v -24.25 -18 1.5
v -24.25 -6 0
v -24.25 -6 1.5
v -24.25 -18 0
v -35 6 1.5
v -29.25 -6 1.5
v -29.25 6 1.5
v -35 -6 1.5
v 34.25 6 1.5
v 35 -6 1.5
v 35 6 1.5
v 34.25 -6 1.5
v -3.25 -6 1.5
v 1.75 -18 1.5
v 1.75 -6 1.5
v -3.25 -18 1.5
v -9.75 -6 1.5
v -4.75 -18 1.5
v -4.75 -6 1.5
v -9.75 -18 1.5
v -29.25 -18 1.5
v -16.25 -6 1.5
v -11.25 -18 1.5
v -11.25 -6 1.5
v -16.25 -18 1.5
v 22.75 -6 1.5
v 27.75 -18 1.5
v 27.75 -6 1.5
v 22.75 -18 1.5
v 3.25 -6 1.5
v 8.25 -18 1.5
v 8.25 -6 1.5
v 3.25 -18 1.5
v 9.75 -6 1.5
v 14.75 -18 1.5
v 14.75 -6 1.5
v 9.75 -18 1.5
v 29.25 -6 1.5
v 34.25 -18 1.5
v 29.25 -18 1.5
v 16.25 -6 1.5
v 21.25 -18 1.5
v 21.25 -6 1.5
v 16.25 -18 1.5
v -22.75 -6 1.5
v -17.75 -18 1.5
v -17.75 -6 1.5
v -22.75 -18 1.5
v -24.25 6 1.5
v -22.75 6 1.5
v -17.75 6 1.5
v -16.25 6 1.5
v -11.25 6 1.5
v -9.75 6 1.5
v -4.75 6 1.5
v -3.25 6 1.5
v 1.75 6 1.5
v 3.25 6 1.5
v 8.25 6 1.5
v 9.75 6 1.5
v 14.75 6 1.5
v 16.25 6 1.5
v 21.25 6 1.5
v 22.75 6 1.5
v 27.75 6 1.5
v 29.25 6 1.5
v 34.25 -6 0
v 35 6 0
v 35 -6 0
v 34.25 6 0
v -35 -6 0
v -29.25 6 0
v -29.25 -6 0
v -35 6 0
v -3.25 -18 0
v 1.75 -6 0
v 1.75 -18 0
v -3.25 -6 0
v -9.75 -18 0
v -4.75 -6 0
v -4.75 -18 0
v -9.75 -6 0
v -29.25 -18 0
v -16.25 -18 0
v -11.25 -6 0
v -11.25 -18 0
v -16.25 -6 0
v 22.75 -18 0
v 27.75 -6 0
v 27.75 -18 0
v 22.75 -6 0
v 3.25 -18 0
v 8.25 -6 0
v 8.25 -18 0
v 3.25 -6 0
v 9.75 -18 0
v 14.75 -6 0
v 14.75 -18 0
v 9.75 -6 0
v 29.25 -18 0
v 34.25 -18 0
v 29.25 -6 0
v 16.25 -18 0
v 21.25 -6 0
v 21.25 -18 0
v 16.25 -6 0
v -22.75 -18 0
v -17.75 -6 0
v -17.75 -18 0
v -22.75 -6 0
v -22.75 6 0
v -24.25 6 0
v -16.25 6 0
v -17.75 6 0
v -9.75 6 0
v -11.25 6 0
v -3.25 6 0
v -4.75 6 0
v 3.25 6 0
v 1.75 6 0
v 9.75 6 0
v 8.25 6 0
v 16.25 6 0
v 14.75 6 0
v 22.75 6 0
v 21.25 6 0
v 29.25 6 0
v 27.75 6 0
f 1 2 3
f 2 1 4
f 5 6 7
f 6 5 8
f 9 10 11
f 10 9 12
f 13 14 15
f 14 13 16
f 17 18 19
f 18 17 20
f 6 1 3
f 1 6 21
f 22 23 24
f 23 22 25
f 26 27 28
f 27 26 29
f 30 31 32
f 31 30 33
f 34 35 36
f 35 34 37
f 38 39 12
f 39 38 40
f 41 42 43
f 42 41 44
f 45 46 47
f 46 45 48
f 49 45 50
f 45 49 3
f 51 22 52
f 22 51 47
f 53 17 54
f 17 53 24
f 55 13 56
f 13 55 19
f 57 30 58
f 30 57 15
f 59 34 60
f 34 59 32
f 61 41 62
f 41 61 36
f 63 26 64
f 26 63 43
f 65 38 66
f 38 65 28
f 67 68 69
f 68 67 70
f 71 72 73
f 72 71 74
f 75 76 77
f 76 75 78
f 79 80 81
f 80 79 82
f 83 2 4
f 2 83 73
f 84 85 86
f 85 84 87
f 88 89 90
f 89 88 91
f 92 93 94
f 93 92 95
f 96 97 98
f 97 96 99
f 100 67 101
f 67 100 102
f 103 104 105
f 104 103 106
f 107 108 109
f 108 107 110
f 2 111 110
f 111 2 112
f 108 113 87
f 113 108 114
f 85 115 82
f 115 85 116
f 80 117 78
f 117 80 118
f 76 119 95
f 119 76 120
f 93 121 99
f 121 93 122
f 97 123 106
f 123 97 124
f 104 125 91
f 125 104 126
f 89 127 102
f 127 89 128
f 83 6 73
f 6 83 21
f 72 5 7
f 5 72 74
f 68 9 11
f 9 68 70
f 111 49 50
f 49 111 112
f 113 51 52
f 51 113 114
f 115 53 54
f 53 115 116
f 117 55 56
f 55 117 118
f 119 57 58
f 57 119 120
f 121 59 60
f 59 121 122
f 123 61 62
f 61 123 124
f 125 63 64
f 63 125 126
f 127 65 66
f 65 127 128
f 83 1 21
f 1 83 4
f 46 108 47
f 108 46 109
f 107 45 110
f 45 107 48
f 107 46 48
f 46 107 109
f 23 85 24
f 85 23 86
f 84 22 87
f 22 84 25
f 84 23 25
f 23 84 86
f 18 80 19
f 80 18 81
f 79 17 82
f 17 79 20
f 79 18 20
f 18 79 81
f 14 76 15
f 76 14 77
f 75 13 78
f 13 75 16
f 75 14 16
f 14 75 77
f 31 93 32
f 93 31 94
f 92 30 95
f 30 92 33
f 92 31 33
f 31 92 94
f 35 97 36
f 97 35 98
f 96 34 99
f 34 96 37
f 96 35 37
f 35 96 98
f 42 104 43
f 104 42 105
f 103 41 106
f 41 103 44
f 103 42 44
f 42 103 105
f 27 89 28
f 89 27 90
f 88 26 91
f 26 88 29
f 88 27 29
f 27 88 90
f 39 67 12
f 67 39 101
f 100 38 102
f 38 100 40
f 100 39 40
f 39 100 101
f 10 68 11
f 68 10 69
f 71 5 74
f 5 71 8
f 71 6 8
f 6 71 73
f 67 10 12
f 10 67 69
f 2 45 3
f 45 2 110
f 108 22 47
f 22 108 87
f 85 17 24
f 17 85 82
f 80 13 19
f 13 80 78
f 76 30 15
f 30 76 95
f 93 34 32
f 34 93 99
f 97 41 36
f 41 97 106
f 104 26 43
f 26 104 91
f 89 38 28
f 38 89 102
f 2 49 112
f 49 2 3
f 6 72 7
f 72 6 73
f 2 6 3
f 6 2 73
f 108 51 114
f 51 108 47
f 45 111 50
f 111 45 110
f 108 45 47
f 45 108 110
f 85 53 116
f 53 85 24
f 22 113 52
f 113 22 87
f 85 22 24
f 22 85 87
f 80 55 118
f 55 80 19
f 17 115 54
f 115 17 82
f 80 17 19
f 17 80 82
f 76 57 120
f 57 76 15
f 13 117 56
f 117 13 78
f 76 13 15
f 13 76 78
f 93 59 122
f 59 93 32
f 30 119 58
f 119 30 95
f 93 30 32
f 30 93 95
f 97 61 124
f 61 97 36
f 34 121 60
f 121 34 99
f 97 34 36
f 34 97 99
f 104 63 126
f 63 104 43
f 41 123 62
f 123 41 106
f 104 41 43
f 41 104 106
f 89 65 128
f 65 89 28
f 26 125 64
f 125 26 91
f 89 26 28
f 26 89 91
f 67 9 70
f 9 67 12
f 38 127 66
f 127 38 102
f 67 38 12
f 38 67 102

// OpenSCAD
// 10-well comb for casting agarose gels, printed lying flat
// Units: mm

$fn = 64;

// --- Spine (back bar) ---
spine_len   = 70;   // spine length along X
spine_wid   = 12;   // spine width along Y
plate_thk   = 1.5;  // plate thickness along Z

// --- Teeth ---
tooth_count = 10;   // number of teeth
tooth_w     = 5.0;  // tooth width along X
tooth_l     = 12;   // tooth length along Y (hangs in -Y)
tooth_gap   = 1.5;  // gap between neighbouring teeth along X

// --- Cutting overlap ---
eps = 0.5;          // extension past cut faces to avoid coplanar faces

difference() {
    // Base plate: spine + teeth
    union() {
        // Spine
        translate([-spine_len/2, -spine_wid/2, 0])
            cube([spine_len, spine_wid, plate_thk]);

        // Teeth row, centred on spine in X
        for (i = [0 : tooth_count - 1]) {
            x = (i - (tooth_count - 1)/2) * (tooth_w + tooth_gap);
            translate([x, -spine_wid/2 - tooth_l, 0])
                cube([tooth_w, tooth_l + spine_wid, plate_thk]);
        }
    }

    // Wells: cut up from -Z into the plate, through the full thickness
    for (i = [0 : tooth_count - 1]) {
        x = (i - (tooth_count - 1)/2) * (tooth_w + tooth_gap);
        translate([x, -spine_wid/2, -eps])
            cube([tooth_w, tooth_l + spine_wid, plate_thk + 2*eps]);
    }
}
